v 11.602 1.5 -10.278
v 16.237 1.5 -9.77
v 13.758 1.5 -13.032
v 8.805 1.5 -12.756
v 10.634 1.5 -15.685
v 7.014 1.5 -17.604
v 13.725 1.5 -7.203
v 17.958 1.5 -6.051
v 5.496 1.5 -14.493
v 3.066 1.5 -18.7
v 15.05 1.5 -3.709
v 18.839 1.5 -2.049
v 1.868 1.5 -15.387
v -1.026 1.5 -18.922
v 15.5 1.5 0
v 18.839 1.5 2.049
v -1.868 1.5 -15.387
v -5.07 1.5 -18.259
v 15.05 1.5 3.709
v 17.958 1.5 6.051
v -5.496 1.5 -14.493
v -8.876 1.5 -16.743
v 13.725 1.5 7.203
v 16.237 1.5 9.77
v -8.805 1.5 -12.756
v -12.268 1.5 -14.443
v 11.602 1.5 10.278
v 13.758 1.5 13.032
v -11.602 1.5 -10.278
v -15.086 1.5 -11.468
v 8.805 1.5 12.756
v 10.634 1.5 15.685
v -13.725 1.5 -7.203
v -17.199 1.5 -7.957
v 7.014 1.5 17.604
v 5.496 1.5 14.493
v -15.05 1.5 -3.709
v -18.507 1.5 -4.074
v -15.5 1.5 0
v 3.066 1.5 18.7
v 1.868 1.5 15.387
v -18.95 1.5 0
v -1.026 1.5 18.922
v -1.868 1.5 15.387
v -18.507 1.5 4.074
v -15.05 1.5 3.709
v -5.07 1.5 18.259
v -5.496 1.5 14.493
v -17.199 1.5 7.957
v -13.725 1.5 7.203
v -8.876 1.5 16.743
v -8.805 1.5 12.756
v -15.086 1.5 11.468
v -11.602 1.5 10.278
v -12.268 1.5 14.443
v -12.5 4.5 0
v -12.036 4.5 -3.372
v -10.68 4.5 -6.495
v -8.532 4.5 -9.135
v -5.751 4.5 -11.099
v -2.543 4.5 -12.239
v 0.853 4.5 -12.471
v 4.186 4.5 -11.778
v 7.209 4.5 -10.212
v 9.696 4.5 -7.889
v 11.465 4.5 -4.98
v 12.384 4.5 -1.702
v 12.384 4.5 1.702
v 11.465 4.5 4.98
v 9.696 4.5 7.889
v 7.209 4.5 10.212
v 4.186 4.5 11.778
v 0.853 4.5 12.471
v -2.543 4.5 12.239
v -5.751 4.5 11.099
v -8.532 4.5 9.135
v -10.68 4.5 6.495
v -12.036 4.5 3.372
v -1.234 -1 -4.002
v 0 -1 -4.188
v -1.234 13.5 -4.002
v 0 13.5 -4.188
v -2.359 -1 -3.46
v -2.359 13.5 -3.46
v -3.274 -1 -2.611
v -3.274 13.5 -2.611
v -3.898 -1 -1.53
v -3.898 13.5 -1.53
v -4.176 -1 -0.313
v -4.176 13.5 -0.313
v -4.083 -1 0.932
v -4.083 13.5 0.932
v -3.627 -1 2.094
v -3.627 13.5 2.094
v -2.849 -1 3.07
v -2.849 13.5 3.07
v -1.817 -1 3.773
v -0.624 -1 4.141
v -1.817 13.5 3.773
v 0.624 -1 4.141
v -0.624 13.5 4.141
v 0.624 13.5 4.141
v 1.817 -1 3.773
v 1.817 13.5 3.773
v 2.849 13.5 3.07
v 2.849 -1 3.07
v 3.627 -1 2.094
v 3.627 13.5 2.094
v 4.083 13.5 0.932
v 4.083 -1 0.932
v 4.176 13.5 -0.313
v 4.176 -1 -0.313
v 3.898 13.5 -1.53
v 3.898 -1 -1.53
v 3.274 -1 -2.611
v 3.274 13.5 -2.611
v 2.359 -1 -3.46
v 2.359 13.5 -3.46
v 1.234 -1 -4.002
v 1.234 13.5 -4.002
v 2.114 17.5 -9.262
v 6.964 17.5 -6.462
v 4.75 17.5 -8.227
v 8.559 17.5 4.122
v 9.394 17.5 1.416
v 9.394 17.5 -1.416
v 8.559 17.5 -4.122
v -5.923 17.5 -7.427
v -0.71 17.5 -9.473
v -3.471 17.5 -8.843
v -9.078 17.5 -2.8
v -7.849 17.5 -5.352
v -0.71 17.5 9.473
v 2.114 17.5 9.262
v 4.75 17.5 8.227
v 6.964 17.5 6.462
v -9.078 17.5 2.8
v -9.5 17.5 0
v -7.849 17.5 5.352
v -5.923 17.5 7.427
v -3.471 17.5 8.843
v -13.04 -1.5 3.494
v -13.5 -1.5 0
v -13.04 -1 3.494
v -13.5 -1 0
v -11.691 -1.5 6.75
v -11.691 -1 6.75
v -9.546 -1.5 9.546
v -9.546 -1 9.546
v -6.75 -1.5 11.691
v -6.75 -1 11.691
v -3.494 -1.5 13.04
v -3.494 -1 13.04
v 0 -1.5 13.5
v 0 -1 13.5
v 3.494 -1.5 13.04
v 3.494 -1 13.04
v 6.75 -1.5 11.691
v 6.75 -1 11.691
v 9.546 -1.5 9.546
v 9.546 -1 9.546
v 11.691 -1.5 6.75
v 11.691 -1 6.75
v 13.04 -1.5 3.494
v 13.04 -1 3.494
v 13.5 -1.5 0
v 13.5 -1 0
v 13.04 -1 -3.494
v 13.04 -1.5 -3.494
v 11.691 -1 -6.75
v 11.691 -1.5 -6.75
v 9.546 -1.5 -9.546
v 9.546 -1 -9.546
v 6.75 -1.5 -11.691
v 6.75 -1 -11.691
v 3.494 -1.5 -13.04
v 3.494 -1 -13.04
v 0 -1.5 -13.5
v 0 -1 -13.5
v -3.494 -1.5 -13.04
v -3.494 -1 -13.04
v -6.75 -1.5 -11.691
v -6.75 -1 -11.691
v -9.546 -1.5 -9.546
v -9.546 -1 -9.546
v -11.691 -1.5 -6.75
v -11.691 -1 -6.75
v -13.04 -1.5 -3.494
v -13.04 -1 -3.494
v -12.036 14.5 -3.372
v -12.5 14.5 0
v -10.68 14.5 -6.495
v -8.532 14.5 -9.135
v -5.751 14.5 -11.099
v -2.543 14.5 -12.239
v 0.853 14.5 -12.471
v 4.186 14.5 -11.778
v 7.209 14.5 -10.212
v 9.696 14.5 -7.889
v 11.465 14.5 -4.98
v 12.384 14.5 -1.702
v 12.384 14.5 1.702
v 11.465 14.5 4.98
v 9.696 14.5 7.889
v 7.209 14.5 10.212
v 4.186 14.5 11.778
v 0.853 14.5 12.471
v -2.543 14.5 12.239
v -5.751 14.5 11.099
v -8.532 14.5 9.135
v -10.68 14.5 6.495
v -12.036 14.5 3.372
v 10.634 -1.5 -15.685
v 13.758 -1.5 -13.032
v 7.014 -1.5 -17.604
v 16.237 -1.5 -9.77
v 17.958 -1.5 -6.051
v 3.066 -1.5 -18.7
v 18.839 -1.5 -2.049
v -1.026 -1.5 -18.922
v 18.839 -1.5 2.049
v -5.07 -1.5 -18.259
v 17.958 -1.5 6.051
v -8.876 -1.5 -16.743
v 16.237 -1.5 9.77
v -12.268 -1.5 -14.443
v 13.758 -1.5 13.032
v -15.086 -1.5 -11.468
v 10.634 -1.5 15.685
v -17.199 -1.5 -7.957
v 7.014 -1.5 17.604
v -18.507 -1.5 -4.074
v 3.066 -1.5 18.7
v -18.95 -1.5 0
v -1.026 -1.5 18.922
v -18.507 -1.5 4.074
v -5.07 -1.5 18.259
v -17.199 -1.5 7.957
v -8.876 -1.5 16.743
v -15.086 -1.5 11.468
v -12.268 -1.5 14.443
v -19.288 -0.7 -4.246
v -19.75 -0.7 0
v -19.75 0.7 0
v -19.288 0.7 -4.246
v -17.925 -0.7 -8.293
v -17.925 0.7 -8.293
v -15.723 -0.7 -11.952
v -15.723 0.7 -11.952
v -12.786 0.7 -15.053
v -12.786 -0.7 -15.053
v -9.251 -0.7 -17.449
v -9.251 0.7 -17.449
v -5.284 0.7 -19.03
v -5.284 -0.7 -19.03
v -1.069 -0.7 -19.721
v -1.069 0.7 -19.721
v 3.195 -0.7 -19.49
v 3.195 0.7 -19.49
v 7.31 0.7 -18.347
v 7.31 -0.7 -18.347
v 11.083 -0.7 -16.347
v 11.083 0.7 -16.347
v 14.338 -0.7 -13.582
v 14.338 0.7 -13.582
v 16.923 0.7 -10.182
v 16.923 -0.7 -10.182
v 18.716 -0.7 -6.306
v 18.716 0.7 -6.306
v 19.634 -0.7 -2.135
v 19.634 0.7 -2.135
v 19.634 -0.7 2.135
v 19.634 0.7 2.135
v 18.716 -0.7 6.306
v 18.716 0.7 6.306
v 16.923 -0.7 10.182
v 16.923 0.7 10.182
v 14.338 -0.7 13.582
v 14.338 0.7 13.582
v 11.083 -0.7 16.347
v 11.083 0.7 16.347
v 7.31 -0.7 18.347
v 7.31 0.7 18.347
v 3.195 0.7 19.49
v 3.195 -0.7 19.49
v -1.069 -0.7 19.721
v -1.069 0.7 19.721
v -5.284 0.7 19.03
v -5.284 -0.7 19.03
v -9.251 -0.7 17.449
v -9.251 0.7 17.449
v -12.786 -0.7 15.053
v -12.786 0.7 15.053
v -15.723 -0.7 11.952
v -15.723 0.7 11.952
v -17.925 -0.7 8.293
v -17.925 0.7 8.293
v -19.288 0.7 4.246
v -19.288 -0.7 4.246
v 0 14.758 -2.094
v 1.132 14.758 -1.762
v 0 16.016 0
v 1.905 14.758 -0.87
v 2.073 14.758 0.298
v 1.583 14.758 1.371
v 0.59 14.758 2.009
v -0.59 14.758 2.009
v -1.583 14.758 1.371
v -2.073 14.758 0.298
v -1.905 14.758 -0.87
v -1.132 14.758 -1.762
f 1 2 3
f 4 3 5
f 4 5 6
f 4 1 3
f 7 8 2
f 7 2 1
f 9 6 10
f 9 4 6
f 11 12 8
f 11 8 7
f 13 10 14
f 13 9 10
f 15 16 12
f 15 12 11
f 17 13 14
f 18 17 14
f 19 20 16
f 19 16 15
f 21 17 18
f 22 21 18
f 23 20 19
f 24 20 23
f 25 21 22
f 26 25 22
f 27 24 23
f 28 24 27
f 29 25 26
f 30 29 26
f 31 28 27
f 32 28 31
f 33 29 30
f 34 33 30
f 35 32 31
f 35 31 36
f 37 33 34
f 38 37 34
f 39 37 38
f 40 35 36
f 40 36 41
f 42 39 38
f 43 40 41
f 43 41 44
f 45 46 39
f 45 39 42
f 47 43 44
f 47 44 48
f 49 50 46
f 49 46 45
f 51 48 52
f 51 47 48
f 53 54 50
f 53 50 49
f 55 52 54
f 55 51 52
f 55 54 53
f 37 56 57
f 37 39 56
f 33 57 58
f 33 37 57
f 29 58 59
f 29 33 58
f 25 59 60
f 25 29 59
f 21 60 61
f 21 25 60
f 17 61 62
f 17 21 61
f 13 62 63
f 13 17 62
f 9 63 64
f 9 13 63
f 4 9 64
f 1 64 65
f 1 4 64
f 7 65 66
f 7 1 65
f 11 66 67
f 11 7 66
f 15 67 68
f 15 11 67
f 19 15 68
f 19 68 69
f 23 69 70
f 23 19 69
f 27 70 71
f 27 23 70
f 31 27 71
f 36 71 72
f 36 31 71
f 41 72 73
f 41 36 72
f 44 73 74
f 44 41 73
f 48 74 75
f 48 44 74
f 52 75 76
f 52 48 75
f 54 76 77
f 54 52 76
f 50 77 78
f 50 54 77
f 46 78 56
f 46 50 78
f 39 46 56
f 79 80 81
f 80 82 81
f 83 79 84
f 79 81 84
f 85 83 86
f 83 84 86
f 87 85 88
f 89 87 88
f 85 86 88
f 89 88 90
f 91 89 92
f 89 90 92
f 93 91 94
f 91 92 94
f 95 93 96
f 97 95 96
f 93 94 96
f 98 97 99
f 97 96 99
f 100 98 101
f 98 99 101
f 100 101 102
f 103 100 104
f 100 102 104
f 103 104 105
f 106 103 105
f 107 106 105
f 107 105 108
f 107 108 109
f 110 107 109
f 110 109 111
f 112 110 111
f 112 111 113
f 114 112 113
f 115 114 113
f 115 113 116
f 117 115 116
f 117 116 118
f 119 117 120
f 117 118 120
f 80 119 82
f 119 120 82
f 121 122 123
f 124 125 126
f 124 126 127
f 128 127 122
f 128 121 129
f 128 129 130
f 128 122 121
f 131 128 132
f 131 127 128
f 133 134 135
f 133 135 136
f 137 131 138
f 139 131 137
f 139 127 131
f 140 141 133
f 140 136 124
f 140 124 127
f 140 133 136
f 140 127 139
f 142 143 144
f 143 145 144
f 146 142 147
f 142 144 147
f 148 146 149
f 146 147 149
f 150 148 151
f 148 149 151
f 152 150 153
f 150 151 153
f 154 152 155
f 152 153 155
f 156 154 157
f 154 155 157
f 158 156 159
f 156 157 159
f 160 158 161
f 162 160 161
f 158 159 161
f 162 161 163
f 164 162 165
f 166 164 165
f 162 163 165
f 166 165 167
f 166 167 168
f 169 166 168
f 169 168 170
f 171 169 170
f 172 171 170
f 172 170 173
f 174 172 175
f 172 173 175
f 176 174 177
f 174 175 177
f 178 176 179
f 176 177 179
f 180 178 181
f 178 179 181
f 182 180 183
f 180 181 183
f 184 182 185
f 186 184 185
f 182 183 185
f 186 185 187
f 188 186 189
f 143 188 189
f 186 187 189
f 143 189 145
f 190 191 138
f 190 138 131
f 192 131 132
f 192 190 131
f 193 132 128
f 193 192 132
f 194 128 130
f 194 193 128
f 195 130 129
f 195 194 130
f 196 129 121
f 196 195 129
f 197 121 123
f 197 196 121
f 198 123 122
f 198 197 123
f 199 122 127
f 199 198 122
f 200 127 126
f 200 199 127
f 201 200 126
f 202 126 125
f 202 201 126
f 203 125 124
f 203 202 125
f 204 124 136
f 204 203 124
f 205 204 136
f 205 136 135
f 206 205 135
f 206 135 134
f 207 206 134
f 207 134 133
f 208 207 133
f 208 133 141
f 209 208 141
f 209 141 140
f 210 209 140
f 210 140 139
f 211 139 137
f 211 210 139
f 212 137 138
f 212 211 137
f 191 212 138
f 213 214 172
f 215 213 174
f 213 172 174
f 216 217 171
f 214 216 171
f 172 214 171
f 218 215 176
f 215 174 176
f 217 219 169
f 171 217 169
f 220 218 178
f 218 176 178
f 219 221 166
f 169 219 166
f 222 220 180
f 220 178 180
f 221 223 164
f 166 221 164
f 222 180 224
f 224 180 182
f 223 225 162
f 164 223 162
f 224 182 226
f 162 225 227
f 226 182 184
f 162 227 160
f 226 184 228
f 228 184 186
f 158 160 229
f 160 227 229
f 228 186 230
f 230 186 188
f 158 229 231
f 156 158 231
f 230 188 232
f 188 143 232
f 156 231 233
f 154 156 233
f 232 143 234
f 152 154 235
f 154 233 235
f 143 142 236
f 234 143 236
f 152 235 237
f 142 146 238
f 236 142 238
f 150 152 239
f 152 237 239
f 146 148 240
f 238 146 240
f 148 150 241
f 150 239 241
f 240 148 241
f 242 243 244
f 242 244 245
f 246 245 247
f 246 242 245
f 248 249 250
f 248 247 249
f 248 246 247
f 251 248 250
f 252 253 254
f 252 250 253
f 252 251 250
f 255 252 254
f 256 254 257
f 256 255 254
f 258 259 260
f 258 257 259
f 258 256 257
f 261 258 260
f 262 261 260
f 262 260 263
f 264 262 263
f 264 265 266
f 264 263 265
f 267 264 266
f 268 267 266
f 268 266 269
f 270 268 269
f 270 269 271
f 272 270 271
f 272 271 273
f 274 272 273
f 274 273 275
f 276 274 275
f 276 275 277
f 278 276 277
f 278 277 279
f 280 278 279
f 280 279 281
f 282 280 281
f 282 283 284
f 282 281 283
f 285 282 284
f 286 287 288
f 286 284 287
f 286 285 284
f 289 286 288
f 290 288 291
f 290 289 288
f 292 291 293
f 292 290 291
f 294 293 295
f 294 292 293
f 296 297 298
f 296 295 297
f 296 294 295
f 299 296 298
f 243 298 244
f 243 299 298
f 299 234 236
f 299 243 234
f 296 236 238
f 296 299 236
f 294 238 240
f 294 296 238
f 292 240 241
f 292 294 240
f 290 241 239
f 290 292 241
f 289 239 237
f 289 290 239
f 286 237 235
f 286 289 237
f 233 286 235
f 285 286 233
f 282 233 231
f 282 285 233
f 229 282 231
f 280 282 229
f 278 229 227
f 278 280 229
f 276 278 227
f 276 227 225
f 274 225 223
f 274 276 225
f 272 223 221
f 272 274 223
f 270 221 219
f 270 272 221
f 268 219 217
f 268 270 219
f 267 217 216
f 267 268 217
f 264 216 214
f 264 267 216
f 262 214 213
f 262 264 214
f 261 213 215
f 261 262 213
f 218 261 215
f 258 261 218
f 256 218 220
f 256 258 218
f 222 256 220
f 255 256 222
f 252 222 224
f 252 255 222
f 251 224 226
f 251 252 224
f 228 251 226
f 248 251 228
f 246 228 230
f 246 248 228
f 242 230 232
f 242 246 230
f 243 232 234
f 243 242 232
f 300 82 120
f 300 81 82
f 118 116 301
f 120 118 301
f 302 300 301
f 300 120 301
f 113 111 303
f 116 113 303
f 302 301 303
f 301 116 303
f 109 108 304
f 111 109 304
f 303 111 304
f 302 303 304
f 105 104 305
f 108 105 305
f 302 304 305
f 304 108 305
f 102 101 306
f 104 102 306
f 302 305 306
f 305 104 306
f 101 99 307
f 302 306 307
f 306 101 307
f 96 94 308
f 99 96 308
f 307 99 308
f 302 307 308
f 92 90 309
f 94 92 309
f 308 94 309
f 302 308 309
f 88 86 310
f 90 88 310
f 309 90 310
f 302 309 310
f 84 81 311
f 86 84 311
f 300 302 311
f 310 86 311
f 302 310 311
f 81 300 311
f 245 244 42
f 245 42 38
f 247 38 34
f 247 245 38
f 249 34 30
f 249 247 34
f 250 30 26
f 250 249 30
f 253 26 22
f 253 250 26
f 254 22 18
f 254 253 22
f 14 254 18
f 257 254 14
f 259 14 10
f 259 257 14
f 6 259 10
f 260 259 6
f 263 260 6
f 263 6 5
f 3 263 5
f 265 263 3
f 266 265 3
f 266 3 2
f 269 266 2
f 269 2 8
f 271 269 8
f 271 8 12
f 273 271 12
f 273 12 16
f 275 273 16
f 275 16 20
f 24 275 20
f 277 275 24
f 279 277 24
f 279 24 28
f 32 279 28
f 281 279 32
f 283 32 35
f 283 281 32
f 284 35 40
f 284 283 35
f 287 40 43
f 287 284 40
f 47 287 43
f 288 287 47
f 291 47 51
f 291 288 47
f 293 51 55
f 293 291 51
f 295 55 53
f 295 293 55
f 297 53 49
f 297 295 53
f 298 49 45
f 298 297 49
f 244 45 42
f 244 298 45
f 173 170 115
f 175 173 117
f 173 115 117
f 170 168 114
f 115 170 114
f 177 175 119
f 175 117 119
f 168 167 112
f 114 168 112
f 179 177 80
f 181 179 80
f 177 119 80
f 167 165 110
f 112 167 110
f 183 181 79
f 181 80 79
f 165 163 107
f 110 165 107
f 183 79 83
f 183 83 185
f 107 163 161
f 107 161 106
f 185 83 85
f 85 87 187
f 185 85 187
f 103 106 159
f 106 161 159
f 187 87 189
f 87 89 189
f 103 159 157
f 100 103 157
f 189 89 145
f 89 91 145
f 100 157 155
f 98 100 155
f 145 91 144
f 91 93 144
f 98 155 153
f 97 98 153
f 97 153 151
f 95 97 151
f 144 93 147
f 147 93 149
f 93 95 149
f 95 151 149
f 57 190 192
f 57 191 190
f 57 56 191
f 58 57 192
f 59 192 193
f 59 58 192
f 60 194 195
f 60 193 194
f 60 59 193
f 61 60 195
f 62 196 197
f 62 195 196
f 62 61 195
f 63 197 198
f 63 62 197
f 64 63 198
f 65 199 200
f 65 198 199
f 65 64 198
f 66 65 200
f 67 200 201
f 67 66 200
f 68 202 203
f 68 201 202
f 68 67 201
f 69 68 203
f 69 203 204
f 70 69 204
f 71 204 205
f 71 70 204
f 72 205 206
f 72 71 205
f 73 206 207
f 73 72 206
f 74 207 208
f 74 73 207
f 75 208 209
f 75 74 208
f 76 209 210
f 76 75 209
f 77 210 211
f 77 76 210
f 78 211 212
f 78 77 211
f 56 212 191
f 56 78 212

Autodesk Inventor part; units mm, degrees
ref_plane "YZ Plane" through (0, 0, 0) normal (1, 0, 0) x (0, 1, 0)
ref_plane "XZ Plane" through (0, 0, 0) normal (0, 1, 0) x (-1, 0, 0)
ref_plane "XY Plane" through (0, 0, 0) normal (0, 0, 1) x (1, 0, 0)
sketch "Sketch1" plane through (0, 0, 0) normal (0, 0, 1) x (1, 0, 0)
  line L0 (0, -5.3) -> (0, 21.3) projected
  line L1 (0, 17.5) -> (-12.5, 17.5)
  line L2 (-12.5, 17.5) -> (-12.5, 1.5)
  line L3 (-12.5, 1.5) -> (-19.75, 1.5)
  line L4 (-19.75, 1.5) -> (-19.75, -1.5)
  line L5 (-19.75, -1.5) -> (-13.5, -1.5)
  line L6 (-13.5, -1.5) -> (-13.5, -1)
  line L7 (-13.5, -1) -> (0, -1)
  point P0 (0, 0)
  point P1 (-19.75, 0)
  dimension "d0" = 39.5
  dimension "d1" = 25
  dimension "d2" = 3
  dimension "d3" = 16
  dimension "d4" = 27
  dimension "d5" = 0.5
revolve "Revolution1" add sketch "Sketch1" angle 360 about axis through (0, -10, 0) along (0, 1, 0)
sketch "Sketch2" plane through (0, -1.5, 0) normal (0, -1, 0) x (1, 0, 0)
  point P0 (0, 0)
  point P1 (0, 0)
hole "Hole1" at (0, -1.5, 0) direction (0, 1, 0) diameter 8.376 depth 15 tip angle 118 thread size "M10x1.5" class "6H" standard "ISO Metric profile"
chamfer "Chamfer1" distance 3 angle 45 1 edges at (12.5, 1.5, 0)
chamfer "Chamfer2" distance 0.8 angle 45 2 edges at (19.75, 1.5, 0) (19.75, -1.5, 0)
chamfer "Chamfer3" distance 3 angle 45 1 edges at (12.5, 17.5, 0)
properties part number "Base Plate" material "Steel, Mild"
